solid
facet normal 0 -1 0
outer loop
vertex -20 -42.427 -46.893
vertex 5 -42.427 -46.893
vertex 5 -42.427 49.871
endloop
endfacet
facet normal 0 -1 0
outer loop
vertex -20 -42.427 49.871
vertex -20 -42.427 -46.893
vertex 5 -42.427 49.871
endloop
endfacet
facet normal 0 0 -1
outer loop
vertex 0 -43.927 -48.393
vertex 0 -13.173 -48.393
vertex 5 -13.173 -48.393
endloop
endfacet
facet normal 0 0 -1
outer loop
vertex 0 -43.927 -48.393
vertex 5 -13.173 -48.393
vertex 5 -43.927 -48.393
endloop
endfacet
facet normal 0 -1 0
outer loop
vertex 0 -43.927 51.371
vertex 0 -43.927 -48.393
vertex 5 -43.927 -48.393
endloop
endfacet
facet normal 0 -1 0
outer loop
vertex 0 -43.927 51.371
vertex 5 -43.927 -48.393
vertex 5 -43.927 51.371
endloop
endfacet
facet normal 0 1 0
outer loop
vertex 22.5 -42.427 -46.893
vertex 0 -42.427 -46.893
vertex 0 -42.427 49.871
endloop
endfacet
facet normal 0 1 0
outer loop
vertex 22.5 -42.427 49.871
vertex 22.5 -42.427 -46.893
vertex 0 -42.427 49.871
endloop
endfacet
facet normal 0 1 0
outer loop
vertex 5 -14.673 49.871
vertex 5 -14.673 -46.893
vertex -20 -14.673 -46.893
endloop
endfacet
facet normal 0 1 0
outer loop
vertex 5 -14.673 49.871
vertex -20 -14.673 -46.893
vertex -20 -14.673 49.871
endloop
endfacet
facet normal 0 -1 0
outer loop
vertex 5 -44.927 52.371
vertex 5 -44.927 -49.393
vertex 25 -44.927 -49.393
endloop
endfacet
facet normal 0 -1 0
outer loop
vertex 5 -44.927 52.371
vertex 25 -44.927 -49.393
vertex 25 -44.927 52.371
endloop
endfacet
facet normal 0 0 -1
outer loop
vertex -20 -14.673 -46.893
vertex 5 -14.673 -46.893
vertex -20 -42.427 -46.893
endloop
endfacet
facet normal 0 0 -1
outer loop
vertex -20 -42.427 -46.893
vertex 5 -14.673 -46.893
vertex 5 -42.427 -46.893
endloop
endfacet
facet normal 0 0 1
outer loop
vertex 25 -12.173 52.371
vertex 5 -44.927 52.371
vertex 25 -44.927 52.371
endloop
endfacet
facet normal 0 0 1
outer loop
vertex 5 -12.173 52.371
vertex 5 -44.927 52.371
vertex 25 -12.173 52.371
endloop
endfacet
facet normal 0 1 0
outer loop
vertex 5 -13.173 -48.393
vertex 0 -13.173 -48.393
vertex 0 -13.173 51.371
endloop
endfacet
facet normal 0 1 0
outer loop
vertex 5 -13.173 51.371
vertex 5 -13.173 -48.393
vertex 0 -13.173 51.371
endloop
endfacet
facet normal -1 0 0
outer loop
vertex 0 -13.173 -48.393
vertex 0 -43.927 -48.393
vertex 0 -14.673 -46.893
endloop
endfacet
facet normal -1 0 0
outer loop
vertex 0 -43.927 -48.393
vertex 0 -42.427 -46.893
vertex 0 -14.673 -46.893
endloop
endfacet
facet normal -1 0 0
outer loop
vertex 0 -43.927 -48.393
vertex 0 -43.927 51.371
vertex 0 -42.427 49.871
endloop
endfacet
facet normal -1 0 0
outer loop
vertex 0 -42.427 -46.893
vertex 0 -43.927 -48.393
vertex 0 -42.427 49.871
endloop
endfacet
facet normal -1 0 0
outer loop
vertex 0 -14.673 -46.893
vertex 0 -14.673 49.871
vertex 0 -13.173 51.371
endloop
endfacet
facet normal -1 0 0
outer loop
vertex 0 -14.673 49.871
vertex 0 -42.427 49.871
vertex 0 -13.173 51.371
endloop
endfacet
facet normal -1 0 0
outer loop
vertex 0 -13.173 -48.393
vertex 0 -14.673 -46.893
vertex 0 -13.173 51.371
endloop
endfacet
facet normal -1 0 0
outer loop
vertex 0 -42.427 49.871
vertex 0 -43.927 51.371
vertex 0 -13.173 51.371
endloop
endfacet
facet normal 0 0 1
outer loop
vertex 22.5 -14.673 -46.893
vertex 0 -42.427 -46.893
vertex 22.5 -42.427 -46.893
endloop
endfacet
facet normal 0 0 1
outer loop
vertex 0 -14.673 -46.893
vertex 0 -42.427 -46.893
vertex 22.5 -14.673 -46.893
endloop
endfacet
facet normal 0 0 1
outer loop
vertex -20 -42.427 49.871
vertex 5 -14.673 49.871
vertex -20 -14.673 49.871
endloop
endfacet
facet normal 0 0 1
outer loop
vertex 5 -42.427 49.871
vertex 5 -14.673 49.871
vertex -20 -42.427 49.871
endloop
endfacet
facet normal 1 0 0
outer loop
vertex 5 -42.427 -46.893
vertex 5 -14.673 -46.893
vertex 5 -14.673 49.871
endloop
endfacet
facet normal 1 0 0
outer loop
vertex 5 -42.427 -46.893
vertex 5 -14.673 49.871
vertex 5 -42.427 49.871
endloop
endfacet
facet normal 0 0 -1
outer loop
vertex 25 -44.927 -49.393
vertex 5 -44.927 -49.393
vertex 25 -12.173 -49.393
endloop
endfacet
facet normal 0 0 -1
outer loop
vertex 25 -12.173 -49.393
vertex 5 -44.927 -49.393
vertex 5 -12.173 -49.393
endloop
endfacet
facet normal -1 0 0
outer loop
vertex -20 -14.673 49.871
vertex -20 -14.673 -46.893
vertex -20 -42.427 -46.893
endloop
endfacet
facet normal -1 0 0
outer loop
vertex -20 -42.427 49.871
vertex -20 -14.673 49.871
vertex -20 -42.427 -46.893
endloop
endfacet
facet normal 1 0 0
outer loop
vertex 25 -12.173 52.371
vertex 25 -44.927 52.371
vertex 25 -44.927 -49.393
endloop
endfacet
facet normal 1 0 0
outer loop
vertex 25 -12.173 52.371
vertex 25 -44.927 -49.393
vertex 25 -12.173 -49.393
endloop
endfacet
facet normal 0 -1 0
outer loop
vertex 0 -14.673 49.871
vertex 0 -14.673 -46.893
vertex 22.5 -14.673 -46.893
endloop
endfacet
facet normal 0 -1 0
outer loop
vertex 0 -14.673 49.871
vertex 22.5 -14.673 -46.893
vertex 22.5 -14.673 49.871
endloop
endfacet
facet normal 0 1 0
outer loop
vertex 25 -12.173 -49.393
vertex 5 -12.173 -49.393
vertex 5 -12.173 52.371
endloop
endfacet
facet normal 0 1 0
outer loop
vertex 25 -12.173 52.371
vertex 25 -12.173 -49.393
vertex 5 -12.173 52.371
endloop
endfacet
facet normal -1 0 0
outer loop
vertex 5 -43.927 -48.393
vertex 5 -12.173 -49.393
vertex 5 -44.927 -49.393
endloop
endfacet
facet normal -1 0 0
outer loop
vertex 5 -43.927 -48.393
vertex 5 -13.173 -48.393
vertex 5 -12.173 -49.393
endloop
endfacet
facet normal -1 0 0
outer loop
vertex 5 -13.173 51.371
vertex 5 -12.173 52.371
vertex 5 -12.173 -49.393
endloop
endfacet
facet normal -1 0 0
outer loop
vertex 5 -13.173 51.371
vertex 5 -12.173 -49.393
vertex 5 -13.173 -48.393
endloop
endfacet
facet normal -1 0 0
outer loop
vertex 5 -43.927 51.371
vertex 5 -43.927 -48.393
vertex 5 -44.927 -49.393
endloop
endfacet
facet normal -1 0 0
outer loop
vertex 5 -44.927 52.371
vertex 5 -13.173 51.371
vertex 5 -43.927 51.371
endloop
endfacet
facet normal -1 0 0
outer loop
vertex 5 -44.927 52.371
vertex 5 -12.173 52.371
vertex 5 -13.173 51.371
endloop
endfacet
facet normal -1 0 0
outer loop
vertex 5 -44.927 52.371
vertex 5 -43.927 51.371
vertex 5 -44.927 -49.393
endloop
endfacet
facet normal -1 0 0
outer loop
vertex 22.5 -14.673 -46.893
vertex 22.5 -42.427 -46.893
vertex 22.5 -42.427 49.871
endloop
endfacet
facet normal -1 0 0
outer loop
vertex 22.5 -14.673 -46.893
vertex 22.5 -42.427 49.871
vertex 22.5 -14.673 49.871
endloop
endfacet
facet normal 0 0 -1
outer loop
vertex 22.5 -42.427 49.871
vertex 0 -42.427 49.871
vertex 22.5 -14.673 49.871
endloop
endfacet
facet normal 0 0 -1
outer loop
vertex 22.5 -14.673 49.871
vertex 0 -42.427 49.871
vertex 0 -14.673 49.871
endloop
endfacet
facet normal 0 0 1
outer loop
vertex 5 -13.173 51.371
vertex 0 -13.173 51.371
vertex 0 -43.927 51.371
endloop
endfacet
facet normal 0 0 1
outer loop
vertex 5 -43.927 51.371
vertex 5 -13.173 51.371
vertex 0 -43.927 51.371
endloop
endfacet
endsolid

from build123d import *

# Parameters (mm, degrees)
F0_W     = 50
F0_H     = 5
F2_SIZE2 = 1
F2_SIZE  = 1
F3_W     = 32.7534852549
F3_H     = 101.7634943128
F4_DEPTH = 25
F5_T     = -2.5
F6_W     = 32.7534852549
F6_H     = 101.7634943128
F6_W_2   = 30.7534852549
F6_H_2   = 99.7634943128
F7_DEPTH = 5
F8_W     = 27.7534852549
F8_H     = 96.7634943128
F9_DEPTH = 25


with BuildPart() as f1:
    # F0 (on Front) → F1 (revolve)
    with BuildSketch(Plane.XZ):
        with Locations((25, 2.5)):
            Rectangle(F0_W, F0_H)
    revolve(axis=Axis((25, 0, 0), (-1, 0, 0)))

    # F2
    f2_edges = [f1.edges().sort_by_distance(p)[0] for p in [
        (50, 0, -5),
        (0, 0, -5),
    ]]
    chamfer(f2_edges, length=F2_SIZE, length2=F2_SIZE2)


with BuildPart() as f4:
    # F3 (on Right) → F4 (new body)
    with BuildSketch(Plane.YZ):
        with Locations((-28.549822513, 1.4887973666)):
            Rectangle(F3_W, F3_H)
    extrude(amount=F4_DEPTH)

    # F5
    f5_openings = [f4.faces().sort_by_distance(p)[0] for p in [
        (0, -28.549823, 1.488797),
    ]]
    offset(amount=F5_T, openings=f5_openings)

    # F6 (on face) → F7 (cut)
    with BuildSketch(Plane(origin=(0, 0, 0), x_dir=(0, -1, 0), z_dir=(-1, 0, 0))):
        with Locations((28.549822513, 1.4887973666)):
            Rectangle(F6_W, F6_H)
        with Locations((28.549822513, 1.4887973666)):
            Rectangle(F6_W_2, F6_H_2, mode=Mode.SUBTRACT)
    extrude(amount=-F7_DEPTH, mode=Mode.SUBTRACT)


with BuildPart() as f9:
    # F8 (on face) → F9 (new body)
    with BuildSketch(Plane(origin=(5, 0, 0), x_dir=(0, -1, 0), z_dir=(-1, 0, 0))):
        with Locations((28.549822513, 1.4887973666)):
            Rectangle(F8_W, F8_H)
    extrude(amount=F9_DEPTH)


solid = Compound([f4.part, f9.part])
